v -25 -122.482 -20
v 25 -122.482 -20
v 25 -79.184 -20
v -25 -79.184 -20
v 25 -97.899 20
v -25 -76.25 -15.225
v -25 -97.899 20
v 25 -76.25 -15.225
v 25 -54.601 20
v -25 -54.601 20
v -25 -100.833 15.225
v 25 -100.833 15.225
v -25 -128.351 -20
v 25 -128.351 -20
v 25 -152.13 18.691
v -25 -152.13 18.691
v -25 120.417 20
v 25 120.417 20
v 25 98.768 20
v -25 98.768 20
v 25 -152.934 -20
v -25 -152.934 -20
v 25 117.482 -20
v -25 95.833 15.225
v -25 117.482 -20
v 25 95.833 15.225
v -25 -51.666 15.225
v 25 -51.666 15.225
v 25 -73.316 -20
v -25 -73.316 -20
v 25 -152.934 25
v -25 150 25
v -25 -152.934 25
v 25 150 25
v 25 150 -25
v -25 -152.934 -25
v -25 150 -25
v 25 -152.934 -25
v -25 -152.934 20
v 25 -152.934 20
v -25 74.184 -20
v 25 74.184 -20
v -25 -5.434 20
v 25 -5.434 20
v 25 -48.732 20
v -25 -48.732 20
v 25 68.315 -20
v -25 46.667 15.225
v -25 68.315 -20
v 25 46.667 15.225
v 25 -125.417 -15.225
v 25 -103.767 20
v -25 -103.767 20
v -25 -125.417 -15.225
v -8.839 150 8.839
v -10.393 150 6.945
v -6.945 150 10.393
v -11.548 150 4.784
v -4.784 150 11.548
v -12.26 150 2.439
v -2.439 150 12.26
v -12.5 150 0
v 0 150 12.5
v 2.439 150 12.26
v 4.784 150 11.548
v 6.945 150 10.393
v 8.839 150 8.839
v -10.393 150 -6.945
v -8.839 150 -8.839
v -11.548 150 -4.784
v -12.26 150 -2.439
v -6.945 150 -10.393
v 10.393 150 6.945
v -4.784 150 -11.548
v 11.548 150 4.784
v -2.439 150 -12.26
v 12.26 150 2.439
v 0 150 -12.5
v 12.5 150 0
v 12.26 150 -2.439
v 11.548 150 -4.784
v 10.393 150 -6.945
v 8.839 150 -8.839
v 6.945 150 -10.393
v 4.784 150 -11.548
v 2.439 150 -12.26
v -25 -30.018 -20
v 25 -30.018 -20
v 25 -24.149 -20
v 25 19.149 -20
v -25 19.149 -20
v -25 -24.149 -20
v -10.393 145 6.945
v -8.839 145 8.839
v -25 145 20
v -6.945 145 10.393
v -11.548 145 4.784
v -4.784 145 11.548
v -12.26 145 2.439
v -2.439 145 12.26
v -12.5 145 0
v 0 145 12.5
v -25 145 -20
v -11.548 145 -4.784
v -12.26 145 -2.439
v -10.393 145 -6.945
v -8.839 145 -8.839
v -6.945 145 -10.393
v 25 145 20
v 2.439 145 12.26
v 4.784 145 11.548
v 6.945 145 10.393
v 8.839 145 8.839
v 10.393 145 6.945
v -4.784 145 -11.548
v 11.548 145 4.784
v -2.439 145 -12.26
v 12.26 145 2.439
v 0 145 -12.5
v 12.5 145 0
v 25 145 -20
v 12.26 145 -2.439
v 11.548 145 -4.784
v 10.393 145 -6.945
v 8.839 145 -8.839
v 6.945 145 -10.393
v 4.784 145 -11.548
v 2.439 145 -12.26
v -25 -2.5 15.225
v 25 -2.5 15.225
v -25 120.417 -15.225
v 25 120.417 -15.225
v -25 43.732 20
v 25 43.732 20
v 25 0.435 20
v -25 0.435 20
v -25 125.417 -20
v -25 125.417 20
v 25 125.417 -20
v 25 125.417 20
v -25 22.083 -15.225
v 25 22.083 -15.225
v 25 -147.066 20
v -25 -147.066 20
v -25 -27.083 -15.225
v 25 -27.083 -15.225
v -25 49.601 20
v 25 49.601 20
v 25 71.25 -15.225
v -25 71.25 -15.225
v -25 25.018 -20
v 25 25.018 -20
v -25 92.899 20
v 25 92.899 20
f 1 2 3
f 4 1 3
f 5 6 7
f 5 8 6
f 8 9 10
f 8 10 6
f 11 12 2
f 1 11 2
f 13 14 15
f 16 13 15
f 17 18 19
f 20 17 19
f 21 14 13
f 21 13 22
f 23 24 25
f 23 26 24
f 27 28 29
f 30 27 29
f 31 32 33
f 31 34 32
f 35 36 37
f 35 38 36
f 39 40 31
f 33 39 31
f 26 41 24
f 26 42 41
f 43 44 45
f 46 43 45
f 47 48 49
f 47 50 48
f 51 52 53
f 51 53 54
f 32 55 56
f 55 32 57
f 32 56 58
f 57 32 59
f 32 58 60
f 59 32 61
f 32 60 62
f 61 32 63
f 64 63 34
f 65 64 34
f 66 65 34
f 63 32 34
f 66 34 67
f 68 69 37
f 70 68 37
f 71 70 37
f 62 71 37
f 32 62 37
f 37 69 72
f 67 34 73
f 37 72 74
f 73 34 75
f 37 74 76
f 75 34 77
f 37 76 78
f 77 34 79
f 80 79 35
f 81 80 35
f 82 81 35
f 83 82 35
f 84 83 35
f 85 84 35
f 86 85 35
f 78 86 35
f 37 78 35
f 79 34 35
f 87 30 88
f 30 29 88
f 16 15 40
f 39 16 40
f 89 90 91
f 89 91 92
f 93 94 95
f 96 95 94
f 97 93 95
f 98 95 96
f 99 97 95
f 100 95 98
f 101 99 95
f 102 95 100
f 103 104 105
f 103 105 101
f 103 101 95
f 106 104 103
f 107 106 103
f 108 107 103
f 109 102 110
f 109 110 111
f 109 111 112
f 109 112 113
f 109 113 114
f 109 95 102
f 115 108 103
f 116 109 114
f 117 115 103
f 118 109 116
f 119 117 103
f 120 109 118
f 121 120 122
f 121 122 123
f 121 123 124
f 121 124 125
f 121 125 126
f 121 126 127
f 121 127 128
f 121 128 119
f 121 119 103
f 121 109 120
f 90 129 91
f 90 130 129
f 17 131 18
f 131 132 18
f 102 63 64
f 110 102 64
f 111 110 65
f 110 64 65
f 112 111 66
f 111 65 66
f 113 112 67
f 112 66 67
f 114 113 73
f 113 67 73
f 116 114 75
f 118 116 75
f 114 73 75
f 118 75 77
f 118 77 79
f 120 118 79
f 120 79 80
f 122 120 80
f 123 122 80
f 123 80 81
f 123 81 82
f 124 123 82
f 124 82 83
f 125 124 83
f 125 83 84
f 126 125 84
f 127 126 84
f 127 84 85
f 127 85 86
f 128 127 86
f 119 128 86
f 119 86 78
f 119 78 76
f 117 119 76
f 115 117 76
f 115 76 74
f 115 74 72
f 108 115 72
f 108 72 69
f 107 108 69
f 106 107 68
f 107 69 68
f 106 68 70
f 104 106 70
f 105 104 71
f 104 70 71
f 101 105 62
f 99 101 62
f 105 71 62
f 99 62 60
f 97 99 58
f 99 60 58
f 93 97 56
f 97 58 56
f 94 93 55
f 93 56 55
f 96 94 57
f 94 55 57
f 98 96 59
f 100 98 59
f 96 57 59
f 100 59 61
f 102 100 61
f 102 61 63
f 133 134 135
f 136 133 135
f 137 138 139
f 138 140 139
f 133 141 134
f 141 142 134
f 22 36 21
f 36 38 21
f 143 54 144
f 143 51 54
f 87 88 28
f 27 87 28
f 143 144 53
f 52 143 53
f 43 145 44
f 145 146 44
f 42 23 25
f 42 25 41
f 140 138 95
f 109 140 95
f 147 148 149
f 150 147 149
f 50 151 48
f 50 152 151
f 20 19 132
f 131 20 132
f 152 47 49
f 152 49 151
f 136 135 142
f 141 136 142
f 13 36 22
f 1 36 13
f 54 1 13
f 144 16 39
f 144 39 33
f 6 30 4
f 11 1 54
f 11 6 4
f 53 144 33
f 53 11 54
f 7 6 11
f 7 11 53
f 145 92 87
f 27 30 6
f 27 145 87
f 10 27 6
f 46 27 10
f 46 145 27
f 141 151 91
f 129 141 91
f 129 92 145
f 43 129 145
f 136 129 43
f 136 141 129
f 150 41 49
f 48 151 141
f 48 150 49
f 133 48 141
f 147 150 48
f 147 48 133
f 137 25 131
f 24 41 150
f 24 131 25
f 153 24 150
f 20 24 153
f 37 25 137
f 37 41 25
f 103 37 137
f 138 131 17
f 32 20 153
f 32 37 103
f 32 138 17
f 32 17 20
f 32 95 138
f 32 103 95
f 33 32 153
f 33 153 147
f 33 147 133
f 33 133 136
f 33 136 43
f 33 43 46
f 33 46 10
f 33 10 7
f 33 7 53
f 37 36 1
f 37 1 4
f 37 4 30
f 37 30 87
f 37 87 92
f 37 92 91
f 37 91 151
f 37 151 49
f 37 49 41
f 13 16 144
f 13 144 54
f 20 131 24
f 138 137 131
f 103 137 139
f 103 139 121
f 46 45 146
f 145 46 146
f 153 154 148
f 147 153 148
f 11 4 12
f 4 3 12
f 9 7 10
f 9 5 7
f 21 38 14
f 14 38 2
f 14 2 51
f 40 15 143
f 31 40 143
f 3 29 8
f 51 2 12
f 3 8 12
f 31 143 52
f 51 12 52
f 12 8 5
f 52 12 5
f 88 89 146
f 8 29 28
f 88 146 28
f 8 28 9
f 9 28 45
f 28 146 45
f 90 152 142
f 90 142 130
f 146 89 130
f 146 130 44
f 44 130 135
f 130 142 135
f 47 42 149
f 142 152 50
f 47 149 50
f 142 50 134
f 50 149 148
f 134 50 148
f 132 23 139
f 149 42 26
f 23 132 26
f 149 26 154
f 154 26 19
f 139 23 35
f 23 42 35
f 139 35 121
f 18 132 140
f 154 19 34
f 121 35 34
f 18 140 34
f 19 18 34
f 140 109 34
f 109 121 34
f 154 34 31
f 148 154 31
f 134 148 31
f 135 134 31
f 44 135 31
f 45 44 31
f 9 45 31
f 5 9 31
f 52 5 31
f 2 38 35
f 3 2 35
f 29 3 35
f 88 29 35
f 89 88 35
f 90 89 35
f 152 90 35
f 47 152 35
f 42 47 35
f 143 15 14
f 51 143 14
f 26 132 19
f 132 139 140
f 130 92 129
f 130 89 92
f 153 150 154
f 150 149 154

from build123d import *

# Parameters (mm, degrees)
SKETCH1_W           = 40
SKETCH1_H           = 19.58331309
BOSS_EXTRUDE1_DEPTH = 25
CUT_EXTRUDE1_REACH  = 306.991
SKETCH2_R           = 12.5


with BuildPart() as part:
    # Sketch1 → Boss-Extrude1 (new, symmetric)
    with BuildSketch(Plane(origin=(0, 0, 0), x_dir=(0, 0, -1), z_dir=(1, 0, 0))):
        Polygon((-25, -150), (-25, 150), (25, 150), (25, -150), (25, -152.934399054), (20, -152.934399054), (20, -150), (20, -128.351099054), (-18.690995821, -152.129907993), (-20, -152.934399054), (-25, -152.934399054), align=None)
        Polygon((15.225378118, 120.41668691), (-20, 120.41668691), (-20, 98.767785964), align=None, mode=Mode.SUBTRACT)
        Polygon((-20, -147.065600946), (-20, -103.767412144), (15.225406311, -125.416682672), align=None, mode=Mode.SUBTRACT)
        Polygon((-20, -97.898614036), (-20, -54.600812144), (15.225378116, -76.250065344), align=None, mode=Mode.SUBTRACT)
        with Locations((-3.9301e-05, 135.208343455)):
            Rectangle(SKETCH1_W, SKETCH1_H, mode=Mode.SUBTRACT)
        Polygon((20, -73.315687856), (20, -30.017885964), (-15.225378116, -51.666434656), align=None, mode=Mode.SUBTRACT)
        Polygon((15.225378116, 71.249734656), (-20, 92.898987856), (-20, 49.601185964), align=None, mode=Mode.SUBTRACT)
        Polygon((15.225378116, 22.083134656), (-20, 43.732387856), (-20, 0.434585964), align=None, mode=Mode.SUBTRACT)
        Polygon((15.225378116, -27.083465344), (-20, -5.434212144), (-20, -48.732014036), align=None, mode=Mode.SUBTRACT)
        Polygon((-15.225378116, 95.833365344), (20, 117.481914036), (20, 74.184112144), align=None, mode=Mode.SUBTRACT)
        Polygon((-15.225378116, 46.666765344), (20, 68.315314036), (20, 25.017512144), align=None, mode=Mode.SUBTRACT)
        Polygon((-15.225378116, -2.499834656), (20, 19.148714036), (20, -24.149087856), align=None, mode=Mode.SUBTRACT)
        Polygon((20, -79.184485964), (-15.225378116, -100.833034656), (20, -122.482287856), align=None, mode=Mode.SUBTRACT)
    extrude(amount=BOSS_EXTRUDE1_DEPTH, both=True)

    # Sketch2 → Cut-Extrude1 (cut, up to next)
    with BuildSketch(Plane(origin=(0, 150, 0), x_dir=(1, 0, 0), z_dir=(0, 1, 0)), mode=Mode.PRIVATE) as cut_extrude1_sk1:
        with Locations(Location((0, 0, 0), (0, 0, 270))):
            Circle(SKETCH2_R)
    cut_extrude1_tool1 = extrude(cut_extrude1_sk1.sketch, amount=-CUT_EXTRUDE1_REACH, mode=Mode.PRIVATE) & part.part
    add(cut_extrude1_tool1.solids().sort_by_distance((0, 150, 0))[0], mode=Mode.SUBTRACT)


solid = part.part
